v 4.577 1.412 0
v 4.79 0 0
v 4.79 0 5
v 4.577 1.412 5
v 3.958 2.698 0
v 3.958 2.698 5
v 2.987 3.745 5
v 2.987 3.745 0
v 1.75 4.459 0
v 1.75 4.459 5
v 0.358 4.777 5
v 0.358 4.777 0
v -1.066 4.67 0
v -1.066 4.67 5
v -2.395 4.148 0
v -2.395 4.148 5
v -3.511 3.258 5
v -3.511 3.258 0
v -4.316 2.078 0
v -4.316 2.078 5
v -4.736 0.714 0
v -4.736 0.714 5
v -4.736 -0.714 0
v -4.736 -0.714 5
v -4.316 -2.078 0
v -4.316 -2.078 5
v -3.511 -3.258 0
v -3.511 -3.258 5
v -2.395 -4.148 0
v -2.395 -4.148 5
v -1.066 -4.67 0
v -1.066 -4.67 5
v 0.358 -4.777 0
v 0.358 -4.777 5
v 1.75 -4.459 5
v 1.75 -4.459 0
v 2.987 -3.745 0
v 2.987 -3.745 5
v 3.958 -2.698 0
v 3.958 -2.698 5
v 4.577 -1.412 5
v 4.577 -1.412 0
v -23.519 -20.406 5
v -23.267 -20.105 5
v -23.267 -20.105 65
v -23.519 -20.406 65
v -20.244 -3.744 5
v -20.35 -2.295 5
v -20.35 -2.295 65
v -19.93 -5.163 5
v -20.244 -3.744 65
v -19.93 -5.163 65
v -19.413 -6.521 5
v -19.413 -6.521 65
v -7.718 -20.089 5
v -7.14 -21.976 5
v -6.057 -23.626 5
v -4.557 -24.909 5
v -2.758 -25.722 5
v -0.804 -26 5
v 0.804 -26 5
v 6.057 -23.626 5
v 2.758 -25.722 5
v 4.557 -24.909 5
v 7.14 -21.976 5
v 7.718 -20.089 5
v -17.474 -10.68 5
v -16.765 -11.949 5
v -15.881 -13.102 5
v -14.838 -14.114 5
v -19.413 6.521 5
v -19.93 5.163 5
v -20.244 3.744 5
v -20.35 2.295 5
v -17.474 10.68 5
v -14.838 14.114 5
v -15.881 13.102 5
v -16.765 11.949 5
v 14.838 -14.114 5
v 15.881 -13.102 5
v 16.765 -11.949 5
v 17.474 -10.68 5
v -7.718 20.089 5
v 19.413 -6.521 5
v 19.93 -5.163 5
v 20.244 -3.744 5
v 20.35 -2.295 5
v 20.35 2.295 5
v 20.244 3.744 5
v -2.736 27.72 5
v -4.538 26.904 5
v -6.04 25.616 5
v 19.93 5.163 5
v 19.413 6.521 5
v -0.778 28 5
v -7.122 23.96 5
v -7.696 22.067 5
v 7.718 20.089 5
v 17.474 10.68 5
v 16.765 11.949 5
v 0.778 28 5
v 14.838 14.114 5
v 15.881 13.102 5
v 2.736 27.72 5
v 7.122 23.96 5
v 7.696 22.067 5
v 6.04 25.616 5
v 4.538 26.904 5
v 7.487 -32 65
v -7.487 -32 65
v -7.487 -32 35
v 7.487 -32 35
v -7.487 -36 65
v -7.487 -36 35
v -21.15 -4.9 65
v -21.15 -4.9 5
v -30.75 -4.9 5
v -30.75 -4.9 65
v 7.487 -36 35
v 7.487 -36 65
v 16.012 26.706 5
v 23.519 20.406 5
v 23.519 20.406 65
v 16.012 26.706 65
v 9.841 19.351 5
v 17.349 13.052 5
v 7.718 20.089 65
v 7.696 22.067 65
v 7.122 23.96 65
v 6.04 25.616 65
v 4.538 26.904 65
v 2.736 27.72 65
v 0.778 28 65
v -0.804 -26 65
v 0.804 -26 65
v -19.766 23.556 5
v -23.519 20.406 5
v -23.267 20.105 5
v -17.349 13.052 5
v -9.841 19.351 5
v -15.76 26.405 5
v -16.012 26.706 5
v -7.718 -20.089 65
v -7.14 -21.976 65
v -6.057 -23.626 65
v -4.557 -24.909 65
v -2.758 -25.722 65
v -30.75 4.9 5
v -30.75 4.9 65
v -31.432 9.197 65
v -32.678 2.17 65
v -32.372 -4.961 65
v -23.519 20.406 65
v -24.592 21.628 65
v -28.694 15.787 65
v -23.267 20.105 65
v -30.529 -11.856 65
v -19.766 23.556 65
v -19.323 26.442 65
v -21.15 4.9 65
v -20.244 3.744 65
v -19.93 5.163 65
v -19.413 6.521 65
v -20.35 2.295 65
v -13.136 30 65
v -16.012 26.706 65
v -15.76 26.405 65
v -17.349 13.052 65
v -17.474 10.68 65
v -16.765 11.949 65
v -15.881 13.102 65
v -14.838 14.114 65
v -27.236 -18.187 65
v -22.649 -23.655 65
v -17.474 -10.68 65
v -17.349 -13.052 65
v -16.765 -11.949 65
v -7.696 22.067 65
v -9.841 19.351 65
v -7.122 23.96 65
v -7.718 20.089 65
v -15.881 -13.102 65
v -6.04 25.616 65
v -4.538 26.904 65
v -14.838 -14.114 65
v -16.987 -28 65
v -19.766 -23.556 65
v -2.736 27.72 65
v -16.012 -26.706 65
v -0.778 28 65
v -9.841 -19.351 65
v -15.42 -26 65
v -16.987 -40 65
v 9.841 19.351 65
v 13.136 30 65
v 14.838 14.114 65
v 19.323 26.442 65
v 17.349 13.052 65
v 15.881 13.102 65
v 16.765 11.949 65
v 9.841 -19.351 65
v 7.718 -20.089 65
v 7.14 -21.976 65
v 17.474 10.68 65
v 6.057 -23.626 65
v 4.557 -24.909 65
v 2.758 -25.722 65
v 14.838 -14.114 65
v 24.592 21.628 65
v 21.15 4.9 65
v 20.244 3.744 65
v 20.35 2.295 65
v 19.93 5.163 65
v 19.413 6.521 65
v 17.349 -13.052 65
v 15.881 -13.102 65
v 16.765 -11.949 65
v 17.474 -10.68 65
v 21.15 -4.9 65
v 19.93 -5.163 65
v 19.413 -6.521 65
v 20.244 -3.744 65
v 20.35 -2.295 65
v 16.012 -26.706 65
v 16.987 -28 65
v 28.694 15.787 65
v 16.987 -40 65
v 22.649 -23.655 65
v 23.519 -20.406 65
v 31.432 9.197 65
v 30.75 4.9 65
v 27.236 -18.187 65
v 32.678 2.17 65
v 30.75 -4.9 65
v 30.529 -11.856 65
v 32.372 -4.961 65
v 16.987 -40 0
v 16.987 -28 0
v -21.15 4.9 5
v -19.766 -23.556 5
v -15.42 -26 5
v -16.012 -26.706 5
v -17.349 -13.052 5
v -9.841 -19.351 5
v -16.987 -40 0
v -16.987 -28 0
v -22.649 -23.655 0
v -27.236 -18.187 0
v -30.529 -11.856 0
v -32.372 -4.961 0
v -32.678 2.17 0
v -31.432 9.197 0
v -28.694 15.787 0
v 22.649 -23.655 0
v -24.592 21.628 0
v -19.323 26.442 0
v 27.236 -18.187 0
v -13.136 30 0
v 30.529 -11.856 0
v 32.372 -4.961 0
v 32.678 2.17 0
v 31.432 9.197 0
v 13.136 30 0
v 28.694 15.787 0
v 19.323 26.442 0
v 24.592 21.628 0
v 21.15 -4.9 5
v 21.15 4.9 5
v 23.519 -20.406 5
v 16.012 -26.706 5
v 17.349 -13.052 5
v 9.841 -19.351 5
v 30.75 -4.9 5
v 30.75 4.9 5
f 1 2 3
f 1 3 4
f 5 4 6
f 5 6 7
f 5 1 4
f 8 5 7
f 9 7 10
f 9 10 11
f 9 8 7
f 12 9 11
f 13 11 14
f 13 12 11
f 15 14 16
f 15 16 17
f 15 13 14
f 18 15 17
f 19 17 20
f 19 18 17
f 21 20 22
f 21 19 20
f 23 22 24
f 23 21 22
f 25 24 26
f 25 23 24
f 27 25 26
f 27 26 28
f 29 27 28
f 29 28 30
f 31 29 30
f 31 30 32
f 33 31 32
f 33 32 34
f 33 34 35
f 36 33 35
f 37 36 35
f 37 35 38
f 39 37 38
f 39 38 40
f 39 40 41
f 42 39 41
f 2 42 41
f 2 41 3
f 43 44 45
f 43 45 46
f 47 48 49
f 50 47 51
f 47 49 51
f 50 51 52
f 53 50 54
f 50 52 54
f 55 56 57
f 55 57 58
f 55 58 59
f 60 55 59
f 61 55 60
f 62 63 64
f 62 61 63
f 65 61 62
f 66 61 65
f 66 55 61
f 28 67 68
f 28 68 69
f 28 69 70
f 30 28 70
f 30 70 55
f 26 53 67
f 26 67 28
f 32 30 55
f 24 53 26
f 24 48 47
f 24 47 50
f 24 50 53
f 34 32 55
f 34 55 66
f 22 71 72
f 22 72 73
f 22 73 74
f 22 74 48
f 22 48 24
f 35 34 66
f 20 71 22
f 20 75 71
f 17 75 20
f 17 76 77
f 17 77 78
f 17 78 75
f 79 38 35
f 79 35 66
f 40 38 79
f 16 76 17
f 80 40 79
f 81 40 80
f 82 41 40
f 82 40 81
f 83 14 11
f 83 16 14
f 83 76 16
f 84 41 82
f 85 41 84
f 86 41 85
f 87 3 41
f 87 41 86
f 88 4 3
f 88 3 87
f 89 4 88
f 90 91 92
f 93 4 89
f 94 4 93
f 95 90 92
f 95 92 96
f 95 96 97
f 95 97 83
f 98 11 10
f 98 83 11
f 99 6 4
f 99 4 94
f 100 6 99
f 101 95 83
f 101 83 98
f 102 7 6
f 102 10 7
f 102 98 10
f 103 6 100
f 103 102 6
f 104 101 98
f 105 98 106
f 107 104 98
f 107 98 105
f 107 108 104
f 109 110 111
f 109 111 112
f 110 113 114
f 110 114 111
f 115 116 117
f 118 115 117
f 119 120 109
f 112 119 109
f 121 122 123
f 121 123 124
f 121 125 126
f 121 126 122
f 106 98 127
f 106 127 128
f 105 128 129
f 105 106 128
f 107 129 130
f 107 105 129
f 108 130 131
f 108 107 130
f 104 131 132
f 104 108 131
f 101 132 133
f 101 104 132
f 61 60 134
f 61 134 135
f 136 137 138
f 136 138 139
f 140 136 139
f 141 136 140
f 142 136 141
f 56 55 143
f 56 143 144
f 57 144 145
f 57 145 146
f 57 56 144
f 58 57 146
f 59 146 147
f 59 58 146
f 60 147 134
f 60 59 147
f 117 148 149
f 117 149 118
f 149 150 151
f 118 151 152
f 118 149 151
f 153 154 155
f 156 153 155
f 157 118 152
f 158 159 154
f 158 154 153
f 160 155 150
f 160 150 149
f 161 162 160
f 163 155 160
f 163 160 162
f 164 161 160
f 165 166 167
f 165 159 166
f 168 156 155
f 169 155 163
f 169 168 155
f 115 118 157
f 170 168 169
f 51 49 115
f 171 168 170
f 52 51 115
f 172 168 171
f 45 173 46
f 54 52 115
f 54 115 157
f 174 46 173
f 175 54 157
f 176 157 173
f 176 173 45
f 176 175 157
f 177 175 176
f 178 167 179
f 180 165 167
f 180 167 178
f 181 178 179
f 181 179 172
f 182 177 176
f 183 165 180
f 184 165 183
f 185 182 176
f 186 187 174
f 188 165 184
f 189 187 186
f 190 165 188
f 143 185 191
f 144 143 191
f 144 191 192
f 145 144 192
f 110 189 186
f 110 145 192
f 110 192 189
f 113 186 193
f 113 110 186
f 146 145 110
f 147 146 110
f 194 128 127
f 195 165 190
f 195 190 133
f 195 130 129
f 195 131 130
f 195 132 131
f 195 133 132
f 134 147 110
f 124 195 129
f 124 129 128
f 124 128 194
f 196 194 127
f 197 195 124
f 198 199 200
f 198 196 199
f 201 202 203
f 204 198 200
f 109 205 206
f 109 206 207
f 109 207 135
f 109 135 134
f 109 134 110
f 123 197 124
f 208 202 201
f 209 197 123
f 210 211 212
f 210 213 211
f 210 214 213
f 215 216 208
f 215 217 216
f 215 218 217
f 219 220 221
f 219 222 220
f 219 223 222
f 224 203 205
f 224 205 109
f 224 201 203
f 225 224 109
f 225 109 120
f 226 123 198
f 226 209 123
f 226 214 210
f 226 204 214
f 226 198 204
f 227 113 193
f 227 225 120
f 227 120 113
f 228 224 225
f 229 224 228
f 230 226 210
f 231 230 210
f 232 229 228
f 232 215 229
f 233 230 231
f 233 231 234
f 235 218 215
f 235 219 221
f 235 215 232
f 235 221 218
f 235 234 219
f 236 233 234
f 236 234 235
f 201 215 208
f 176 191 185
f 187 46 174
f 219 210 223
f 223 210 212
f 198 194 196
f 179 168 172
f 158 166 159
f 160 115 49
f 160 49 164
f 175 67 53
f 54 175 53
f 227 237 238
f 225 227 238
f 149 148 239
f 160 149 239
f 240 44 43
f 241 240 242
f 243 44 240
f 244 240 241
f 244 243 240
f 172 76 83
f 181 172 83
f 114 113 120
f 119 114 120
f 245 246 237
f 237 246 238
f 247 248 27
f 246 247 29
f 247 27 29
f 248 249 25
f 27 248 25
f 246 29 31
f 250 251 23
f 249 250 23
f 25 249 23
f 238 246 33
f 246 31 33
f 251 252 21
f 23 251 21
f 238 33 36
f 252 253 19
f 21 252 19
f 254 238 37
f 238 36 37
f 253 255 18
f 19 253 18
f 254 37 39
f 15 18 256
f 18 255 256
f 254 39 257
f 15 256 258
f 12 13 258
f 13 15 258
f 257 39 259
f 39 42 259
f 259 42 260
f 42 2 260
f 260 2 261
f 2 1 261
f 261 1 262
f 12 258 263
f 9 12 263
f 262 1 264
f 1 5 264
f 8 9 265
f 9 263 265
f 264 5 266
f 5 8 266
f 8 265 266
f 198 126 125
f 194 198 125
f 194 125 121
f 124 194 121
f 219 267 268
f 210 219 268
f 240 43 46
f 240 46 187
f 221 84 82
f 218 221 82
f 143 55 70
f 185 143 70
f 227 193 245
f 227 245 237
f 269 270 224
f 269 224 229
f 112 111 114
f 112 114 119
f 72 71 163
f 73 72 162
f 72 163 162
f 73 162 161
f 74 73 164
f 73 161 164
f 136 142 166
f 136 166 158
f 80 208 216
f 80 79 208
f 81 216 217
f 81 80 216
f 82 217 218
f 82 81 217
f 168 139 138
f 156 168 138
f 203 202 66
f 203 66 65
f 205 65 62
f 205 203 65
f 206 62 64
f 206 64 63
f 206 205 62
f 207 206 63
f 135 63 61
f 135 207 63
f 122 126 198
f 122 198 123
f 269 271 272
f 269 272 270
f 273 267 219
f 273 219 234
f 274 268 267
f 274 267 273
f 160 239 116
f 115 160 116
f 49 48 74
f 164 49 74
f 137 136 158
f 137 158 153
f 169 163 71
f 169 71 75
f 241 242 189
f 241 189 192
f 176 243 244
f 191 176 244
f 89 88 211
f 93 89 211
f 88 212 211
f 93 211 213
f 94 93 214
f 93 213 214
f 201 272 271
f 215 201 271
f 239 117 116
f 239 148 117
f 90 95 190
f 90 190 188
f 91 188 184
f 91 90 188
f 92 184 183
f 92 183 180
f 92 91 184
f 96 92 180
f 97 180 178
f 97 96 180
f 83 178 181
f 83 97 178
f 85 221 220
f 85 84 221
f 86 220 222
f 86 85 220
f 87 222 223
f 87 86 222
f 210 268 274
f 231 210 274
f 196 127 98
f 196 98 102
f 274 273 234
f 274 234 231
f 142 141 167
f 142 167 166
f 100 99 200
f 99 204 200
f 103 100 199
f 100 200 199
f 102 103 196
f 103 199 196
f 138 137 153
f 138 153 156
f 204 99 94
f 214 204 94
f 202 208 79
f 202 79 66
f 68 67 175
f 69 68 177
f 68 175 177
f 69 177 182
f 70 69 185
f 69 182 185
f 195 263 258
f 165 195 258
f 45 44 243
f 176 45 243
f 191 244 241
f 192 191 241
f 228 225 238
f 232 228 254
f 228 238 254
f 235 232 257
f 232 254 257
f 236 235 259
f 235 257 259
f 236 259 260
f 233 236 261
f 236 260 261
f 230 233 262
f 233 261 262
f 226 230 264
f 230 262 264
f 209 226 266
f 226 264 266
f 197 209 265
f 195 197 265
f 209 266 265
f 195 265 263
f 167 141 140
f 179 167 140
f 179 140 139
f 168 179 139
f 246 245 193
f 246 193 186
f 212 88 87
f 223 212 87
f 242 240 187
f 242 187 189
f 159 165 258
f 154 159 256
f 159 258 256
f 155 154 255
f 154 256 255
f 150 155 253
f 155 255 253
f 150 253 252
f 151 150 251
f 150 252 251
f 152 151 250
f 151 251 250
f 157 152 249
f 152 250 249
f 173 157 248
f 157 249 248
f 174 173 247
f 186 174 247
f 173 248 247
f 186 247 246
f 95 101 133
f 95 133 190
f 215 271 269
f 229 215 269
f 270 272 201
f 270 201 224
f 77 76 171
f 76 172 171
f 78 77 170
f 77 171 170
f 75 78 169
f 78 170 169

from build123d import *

# Parameters (mm, degrees)
SKETCH2_R                       = 4.79
BOSS_EXTRUDE2_DEPTH             = 65
SHELL4_START                    = 5
SHELL4_OUTLINE_R                = 4.79
SHELL4_DEPTH                    = 60
SKETCH3_W                       = 33.974254958
SKETCH3_H                       = 12
BOSS_EXTRUDE3_DEPTH             = 65
SKETCH4_W                       = 14.974254958
SKETCH4_H                       = 4
CUT_EXTRUDE1_DEPTH              = 30
BOSS_EXTRUDE4_DEPTH             = 60
CIRPATTERN2_COUNT               = 3
CIRPATTERN2_ANGLE               = 50
CIRPATTERN2_THE_OTHER_WAY_COUNT = 3
CIRPATTERN2_THE_OTHER_WAY_ANGLE = 50
SKETCH5_4_W                     = 9.6
SKETCH5_4_H                     = 9.8
CUT_EXTRUDE2_DEPTH              = 60
CIRPATTERN3_COUNT               = 2
CIRPATTERN3_ANGLE               = 50
CIRPATTERN3_THE_OTHER_WAY_COUNT = 2
CIRPATTERN3_THE_OTHER_WAY_ANGLE = 50
MIRROR1_START                   = 5
MIRROR1_DEPTH                   = 60
MIRROR1_2_DEPTH                 = 60
FILLET2_R                       = 10
FILLET6_R                       = 7


# Read off the part's stored shape, not the designer's step: Shell4, Mirror1
with BuildPart() as part:
    # Sketch2 → Boss-Extrude2 (new body)
    with BuildSketch(Plane.XY):
        with BuildLine():
            Line((13.136304655, 30), (-13.136304655, 30))
            ThreePointArc((-13.136304655, 30), (-32.678055188, 2.169610358), (-16.987127479, -28))
            Line((-16.987127479, -28), (16.987127479, -28))
            ThreePointArc((16.987127479, -28), (32.678055188, 2.169610358), (13.136304655, 30))
        make_face()
        Circle(SKETCH2_R, mode=Mode.SUBTRACT)
    extrude(amount=BOSS_EXTRUDE2_DEPTH)

    # Shell4 outline → Shell4 (cut)
    with BuildSketch(Plane.XY.offset(SHELL4_START)):
        with BuildLine():
            ThreePointArc((-12.710723819, 28), (-30.677774708, 2.106333062), (-16.418358627, -26))
            Line((-16.418358627, -26), (16.418358627, -26))
            ThreePointArc((16.418358627, -26), (30.677774708, 2.106333062), (12.710723819, 28))
            Line((12.710723819, 28), (-12.710723819, 28))
        make_face()
        Circle(SHELL4_OUTLINE_R, mode=Mode.SUBTRACT)
    extrude(amount=SHELL4_DEPTH, mode=Mode.SUBTRACT)

    # Sketch3 → Boss-Extrude3 (add)
    with BuildSketch(Plane.XY.offset(65)):
        with Locations((0, -34)):
            Rectangle(SKETCH3_W, SKETCH3_H)
    extrude(amount=-BOSS_EXTRUDE3_DEPTH)

    # Sketch4 → Cut-Extrude1 (cut)
    with BuildSketch(Plane.XY.offset(65)):
        with Locations((0, -34)):
            Rectangle(SKETCH4_W, SKETCH4_H)
    extrude(amount=-CUT_EXTRUDE1_DEPTH, mode=Mode.SUBTRACT)

    # Sketch5 → Boss-Extrude4 (add)
    with BuildSketch(Plane.XY.offset(5)):
        with BuildLine():
            Line((21.15, 0), (20.35, 0))
            Line((20.35, 0), (20.35, -7))
            Line((20.35, -7), (29.551861194, -8.5))
            ThreePointArc((29.551861194, -8.5), (30.008505534, -6.712085787), (30.357083193, -4.9))
            Line((30.357083193, -4.9), (21.15, -4.9))
            Line((21.15, -4.9), (21.15, 0))
        make_face()
        with BuildLine():
            Line((20.35, 7), (20.35, 0))
            Line((20.35, 0), (21.15, 0))
            Line((21.15, 0), (21.15, 4.9))
            Line((21.15, 4.9), (30.357083193, 4.9))
            ThreePointArc((30.357083193, 4.9), (30.008505534, 6.712085787), (29.551861194, 8.5))
            Line((29.551861194, 8.5), (20.35, 7))
        make_face()
        with BuildLine():
            Line((30.75, 0), (21.15, 0))
            Line((21.15, 0), (21.15, -4.9))
            Line((21.15, -4.9), (30.357083193, -4.9))
            ThreePointArc((30.357083193, -4.9), (30.651613401, -2.457864094), (30.75, 0))
        make_face()
        with BuildLine():
            Line((21.15, 4.9), (21.15, 0))
            Line((21.15, 0), (30.75, 0))
            ThreePointArc((30.75, 0), (30.651613401, 2.457864094), (30.357083193, 4.9))
            Line((30.357083193, 4.9), (21.15, 4.9))
        make_face()
    boss_extrude4 = extrude(amount=BOSS_EXTRUDE4_DEPTH)

    # CirPattern2: Boss-Extrude4 ×3 about axis
    cirpattern2_axis = Axis((0, 0, 0), (0, 0, -1))
    for i in range(1, CIRPATTERN2_COUNT):
        add(boss_extrude4.rotate(cirpattern2_axis, i * CIRPATTERN2_ANGLE / (CIRPATTERN2_COUNT - 1)))

    # CirPattern2 the other way: Boss-Extrude4 ×3 about axis
    cirpattern2_the_other_way_axis = Axis((0, 0, 0), (0, 0, 1))
    for i in range(1, CIRPATTERN2_THE_OTHER_WAY_COUNT):
        add(boss_extrude4.rotate(cirpattern2_the_other_way_axis, i * CIRPATTERN2_THE_OTHER_WAY_ANGLE / (CIRPATTERN2_THE_OTHER_WAY_COUNT - 1)))

    # Sketch5<4> → Cut-Extrude2 (cut)
    with BuildSketch(Plane.XY.offset(5)):
        with Locations((25.95, 0)):
            Rectangle(SKETCH5_4_W, SKETCH5_4_H)
    cut_extrude2 = extrude(amount=CUT_EXTRUDE2_DEPTH, mode=Mode.SUBTRACT)

    # CirPattern3: Cut-Extrude2 ×2 about axis
    cirpattern3_axis = Axis((0, 0, 0), (0, 0, 1))
    for i in range(1, CIRPATTERN3_COUNT):
        add(cut_extrude2.rotate(cirpattern3_axis, i * CIRPATTERN3_ANGLE / (CIRPATTERN3_COUNT - 1)), mode=Mode.SUBTRACT)

    # CirPattern3 the other way: Cut-Extrude2 ×2 about axis
    cirpattern3_the_other_way_axis = Axis((0, 0, 0), (0, 0, -1))
    for i in range(1, CIRPATTERN3_THE_OTHER_WAY_COUNT):
        add(cut_extrude2.rotate(cirpattern3_the_other_way_axis, i * CIRPATTERN3_THE_OTHER_WAY_ANGLE / (CIRPATTERN3_THE_OTHER_WAY_COUNT - 1)), mode=Mode.SUBTRACT)

    # Mirror1 outline → Mirror1 (cut)
    with BuildSketch(Plane.XY.offset(MIRROR1_START)):
        with BuildLine():
            Line((-30.357083193, 4.9), (-30.75, 4.9))
            Line((-30.75, 4.9), (-30.75, 0))
            ThreePointArc((-30.75, 0), (-30.651613401, 2.457864094), (-30.357083193, 4.9))
        make_face()
        with BuildLine():
            ThreePointArc((-30.357083193, -4.9), (-30.651613401, -2.457864094), (-30.75, 0))
            Line((-30.75, 0), (-30.75, -4.9))
            Line((-30.75, -4.9), (-30.357083193, -4.9))
        make_face()
        with BuildLine():
            Line((-23.519336769, 20.406207338), (-23.266774714, 20.105215602))
            ThreePointArc((-23.266774714, 20.105215602), (-21.585264808, 21.90065851), (-19.765620831, 23.555948998))
            Line((-19.765620831, 23.555948998), (-23.519336769, 20.406207338))
        make_face()
        with BuildLine():
            Line((-16.012101227, 26.705525913), (-19.765620831, 23.555948998))
            ThreePointArc((-19.765620831, 23.555948998), (-17.819591962, 25.060419835), (-15.759539172, 26.404534177))
            Line((-15.759539172, 26.404534177), (-16.012101227, 26.705525913))
        make_face()
        with BuildLine():
            ThreePointArc((-19.765615493, -23.555953477), (-21.585262326, -21.900660956), (-23.266774714, -20.105215602))
            Line((-23.266774714, -20.105215602), (-23.519336769, -20.406207338))
            Line((-23.519336769, -20.406207338), (-19.765615493, -23.555953477))
        make_face()
        with BuildLine():
            ThreePointArc((-16.418358627, -26), (-18.133210875, -24.834435032), (-19.765615493, -23.555953477))
            Line((-19.765615493, -23.555953477), (-16.012101227, -26.705525913))
            Line((-16.012101227, -26.705525913), (-15.420094694, -26))
            Line((-15.420094694, -26), (-16.418358627, -26))
        make_face()
    extrude(amount=MIRROR1_DEPTH, mode=Mode.SUBTRACT)

    # Mirror1 2 outline → Mirror1 2 (add)
    with BuildSketch(Plane.XY.offset(MIRROR1_START)):
        with BuildLine():
            ThreePointArc((-23.266774714, 20.105215602), (-27.868964451, 12.995511548), (-30.357083193, 4.9))
            Line((-30.357083193, 4.9), (-21.15, 4.9))
            Line((-21.15, 4.9), (-21.15, -4.9))
            Line((-21.15, -4.9), (-30.357083193, -4.9))
            ThreePointArc((-30.357083193, -4.9), (-27.868964451, -12.995511548), (-23.266774714, -20.105215602))
            Line((-23.266774714, -20.105215602), (-17.348575716, -13.052180685))
            Line((-17.348575716, -13.052180685), (-9.841340174, -19.351499259))
            Line((-9.841340174, -19.351499259), (-15.420094694, -26))
            Line((-15.420094694, -26), (-11.234208489, -26))
            Line((-11.234208489, -26), (-7.718416755, -20.088517685))
            Line((-7.718416755, -20.088517685), (-16.536726932, -12.689076868))
            Line((-16.536726932, -12.689076868), (-20.35, -4.511486385))
            Line((-20.35, -4.511486385), (-20.35, 4.511486385))
            Line((-20.35, 4.511486385), (-16.536726932, 12.689076868))
            Line((-16.536726932, 12.689076868), (-7.718416755, 20.088517685))
            Line((-7.718416755, 20.088517685), (-12.423687387, 28))
            Line((-12.423687387, 28), (-12.710723819, 28))
            ThreePointArc((-12.710723819, 28), (-14.257466342, 27.244947302), (-15.759539172, 26.404534177))
            Line((-15.759539172, 26.404534177), (-9.841340174, 19.351499259))
            Line((-9.841340174, 19.351499259), (-17.348575716, 13.052180685))
            Line((-17.348575716, 13.052180685), (-23.266774714, 20.105215602))
        make_face()
    extrude(amount=MIRROR1_2_DEPTH)

    # Fillet2
    fillet2_edges = [part.edges().sort_by_distance(p)[0] for p in [
        (20.35, 4.511486385, 35),
        (16.536726932, 12.689076868, 35),
        (-20.35, -4.511486385, 35),
        (-16.536726932, -12.689076868, 35),
        (-20.35, 4.511486385, 35),
        (-16.536726932, 12.689076868, 35),
        (20.35, -4.511486385, 35),
        (16.536726932, -12.689076868, 35),
    ]]
    fillet(fillet2_edges, radius=FILLET2_R)

    # Fillet6
    # the kernel refuses this fillet: 7 mm, written as the material it adds along each edge
    with BuildSketch(Plane(origin=(12.423687387, 28, 5), x_dir=(-0.5111673704735938, -0.8594811919775275, 0), z_dir=(0, 0, 1))) as fillet6_piece_1:
        with BuildLine():
            CenterArc((11.96925694, -6.431066244), FILLET6_R, 113.259789789, 97.48182924)
            Line((5.952888596, -10.009237838), (5.832561229, -10.08080127))
            Line((5.832561229, -10.08080127), (-0.120327367, -0.071563432))
            Line((-0.120327367, -0.071563432), (0, 0.14))
            ThreePointArc((0, 0.14), (4.602475533, 0.14), (9.149664949, 0.128621325))
            Line((9.149664949, 0.128621325), (9.204951066, 0))
        make_face()
    extrude(amount=60)
    with BuildSketch(Plane(origin=(-11.234208489, -26, 5), x_dir=(1, 0, 0), z_dir=(0, 0, 1))) as fillet6_piece_2:
        with BuildLine():
            CenterArc((10.430640196, 7), FILLET6_R, 188.945942292, 81.054057708)
            Line((3.515791734, 5.911482315), (3.377494765, 5.889711961))
            ThreePointArc((3.377494765, 5.889711961), (1.6375685, 3.027304589), (-0.120327367, 0.071563432))
            Line((-0.120327367, 0.071563432), (0, -0.14))
            Line((0, -0.14), (10.430640196, -0.14))
            Line((10.430640196, -0.14), (10.430640196, 0))
        make_face()
    extrude(amount=60)
    with BuildSketch(Plane(origin=(-12.423687387, 28, 5), x_dir=(1, 0, 0), z_dir=(0, 0, 1))) as fillet6_piece_3:
        with BuildLine():
            CenterArc((11.645674078, -7), FILLET6_R, 90, 97.481829242)
            Line((4.705270632, -7.911482315), (4.566462563, -7.929711961))
            ThreePointArc((4.566462563, -7.929711961), (2.232307949, -4.027304589), (-0.120327367, -0.071563432))
            Line((-0.120327367, -0.071563432), (0, 0.14))
            Line((0, 0.14), (11.645674078, 0.14))
            Line((11.645674078, 0.14), (11.645674078, 0))
        make_face()
    extrude(amount=60)
    with BuildSketch(Plane(origin=(11.234208489, -26, 65), x_dir=(-0.5111673704735934, 0.8594811919775279, 0), z_dir=(0, 0, -1))) as fillet6_piece_4:
        with BuildLine():
            CenterArc((11.348171265, -5.386767475), FILLET6_R, 129.687561323, 81.054057706)
            Line((5.331802921, -8.964939069), (5.211475554, -9.036502501))
            Line((5.211475554, -9.036502501), (-0.120327367, -0.071563432))
            Line((-0.120327367, -0.071563432), (0, 0.14))
            ThreePointArc((0, 0.14), (3.438982941, 0.14), (6.788561774, 0.10773535))
            Line((6.788561774, 0.10773535), (6.877965882, 0))
        make_face()
    extrude(amount=60)


solid = part.part
